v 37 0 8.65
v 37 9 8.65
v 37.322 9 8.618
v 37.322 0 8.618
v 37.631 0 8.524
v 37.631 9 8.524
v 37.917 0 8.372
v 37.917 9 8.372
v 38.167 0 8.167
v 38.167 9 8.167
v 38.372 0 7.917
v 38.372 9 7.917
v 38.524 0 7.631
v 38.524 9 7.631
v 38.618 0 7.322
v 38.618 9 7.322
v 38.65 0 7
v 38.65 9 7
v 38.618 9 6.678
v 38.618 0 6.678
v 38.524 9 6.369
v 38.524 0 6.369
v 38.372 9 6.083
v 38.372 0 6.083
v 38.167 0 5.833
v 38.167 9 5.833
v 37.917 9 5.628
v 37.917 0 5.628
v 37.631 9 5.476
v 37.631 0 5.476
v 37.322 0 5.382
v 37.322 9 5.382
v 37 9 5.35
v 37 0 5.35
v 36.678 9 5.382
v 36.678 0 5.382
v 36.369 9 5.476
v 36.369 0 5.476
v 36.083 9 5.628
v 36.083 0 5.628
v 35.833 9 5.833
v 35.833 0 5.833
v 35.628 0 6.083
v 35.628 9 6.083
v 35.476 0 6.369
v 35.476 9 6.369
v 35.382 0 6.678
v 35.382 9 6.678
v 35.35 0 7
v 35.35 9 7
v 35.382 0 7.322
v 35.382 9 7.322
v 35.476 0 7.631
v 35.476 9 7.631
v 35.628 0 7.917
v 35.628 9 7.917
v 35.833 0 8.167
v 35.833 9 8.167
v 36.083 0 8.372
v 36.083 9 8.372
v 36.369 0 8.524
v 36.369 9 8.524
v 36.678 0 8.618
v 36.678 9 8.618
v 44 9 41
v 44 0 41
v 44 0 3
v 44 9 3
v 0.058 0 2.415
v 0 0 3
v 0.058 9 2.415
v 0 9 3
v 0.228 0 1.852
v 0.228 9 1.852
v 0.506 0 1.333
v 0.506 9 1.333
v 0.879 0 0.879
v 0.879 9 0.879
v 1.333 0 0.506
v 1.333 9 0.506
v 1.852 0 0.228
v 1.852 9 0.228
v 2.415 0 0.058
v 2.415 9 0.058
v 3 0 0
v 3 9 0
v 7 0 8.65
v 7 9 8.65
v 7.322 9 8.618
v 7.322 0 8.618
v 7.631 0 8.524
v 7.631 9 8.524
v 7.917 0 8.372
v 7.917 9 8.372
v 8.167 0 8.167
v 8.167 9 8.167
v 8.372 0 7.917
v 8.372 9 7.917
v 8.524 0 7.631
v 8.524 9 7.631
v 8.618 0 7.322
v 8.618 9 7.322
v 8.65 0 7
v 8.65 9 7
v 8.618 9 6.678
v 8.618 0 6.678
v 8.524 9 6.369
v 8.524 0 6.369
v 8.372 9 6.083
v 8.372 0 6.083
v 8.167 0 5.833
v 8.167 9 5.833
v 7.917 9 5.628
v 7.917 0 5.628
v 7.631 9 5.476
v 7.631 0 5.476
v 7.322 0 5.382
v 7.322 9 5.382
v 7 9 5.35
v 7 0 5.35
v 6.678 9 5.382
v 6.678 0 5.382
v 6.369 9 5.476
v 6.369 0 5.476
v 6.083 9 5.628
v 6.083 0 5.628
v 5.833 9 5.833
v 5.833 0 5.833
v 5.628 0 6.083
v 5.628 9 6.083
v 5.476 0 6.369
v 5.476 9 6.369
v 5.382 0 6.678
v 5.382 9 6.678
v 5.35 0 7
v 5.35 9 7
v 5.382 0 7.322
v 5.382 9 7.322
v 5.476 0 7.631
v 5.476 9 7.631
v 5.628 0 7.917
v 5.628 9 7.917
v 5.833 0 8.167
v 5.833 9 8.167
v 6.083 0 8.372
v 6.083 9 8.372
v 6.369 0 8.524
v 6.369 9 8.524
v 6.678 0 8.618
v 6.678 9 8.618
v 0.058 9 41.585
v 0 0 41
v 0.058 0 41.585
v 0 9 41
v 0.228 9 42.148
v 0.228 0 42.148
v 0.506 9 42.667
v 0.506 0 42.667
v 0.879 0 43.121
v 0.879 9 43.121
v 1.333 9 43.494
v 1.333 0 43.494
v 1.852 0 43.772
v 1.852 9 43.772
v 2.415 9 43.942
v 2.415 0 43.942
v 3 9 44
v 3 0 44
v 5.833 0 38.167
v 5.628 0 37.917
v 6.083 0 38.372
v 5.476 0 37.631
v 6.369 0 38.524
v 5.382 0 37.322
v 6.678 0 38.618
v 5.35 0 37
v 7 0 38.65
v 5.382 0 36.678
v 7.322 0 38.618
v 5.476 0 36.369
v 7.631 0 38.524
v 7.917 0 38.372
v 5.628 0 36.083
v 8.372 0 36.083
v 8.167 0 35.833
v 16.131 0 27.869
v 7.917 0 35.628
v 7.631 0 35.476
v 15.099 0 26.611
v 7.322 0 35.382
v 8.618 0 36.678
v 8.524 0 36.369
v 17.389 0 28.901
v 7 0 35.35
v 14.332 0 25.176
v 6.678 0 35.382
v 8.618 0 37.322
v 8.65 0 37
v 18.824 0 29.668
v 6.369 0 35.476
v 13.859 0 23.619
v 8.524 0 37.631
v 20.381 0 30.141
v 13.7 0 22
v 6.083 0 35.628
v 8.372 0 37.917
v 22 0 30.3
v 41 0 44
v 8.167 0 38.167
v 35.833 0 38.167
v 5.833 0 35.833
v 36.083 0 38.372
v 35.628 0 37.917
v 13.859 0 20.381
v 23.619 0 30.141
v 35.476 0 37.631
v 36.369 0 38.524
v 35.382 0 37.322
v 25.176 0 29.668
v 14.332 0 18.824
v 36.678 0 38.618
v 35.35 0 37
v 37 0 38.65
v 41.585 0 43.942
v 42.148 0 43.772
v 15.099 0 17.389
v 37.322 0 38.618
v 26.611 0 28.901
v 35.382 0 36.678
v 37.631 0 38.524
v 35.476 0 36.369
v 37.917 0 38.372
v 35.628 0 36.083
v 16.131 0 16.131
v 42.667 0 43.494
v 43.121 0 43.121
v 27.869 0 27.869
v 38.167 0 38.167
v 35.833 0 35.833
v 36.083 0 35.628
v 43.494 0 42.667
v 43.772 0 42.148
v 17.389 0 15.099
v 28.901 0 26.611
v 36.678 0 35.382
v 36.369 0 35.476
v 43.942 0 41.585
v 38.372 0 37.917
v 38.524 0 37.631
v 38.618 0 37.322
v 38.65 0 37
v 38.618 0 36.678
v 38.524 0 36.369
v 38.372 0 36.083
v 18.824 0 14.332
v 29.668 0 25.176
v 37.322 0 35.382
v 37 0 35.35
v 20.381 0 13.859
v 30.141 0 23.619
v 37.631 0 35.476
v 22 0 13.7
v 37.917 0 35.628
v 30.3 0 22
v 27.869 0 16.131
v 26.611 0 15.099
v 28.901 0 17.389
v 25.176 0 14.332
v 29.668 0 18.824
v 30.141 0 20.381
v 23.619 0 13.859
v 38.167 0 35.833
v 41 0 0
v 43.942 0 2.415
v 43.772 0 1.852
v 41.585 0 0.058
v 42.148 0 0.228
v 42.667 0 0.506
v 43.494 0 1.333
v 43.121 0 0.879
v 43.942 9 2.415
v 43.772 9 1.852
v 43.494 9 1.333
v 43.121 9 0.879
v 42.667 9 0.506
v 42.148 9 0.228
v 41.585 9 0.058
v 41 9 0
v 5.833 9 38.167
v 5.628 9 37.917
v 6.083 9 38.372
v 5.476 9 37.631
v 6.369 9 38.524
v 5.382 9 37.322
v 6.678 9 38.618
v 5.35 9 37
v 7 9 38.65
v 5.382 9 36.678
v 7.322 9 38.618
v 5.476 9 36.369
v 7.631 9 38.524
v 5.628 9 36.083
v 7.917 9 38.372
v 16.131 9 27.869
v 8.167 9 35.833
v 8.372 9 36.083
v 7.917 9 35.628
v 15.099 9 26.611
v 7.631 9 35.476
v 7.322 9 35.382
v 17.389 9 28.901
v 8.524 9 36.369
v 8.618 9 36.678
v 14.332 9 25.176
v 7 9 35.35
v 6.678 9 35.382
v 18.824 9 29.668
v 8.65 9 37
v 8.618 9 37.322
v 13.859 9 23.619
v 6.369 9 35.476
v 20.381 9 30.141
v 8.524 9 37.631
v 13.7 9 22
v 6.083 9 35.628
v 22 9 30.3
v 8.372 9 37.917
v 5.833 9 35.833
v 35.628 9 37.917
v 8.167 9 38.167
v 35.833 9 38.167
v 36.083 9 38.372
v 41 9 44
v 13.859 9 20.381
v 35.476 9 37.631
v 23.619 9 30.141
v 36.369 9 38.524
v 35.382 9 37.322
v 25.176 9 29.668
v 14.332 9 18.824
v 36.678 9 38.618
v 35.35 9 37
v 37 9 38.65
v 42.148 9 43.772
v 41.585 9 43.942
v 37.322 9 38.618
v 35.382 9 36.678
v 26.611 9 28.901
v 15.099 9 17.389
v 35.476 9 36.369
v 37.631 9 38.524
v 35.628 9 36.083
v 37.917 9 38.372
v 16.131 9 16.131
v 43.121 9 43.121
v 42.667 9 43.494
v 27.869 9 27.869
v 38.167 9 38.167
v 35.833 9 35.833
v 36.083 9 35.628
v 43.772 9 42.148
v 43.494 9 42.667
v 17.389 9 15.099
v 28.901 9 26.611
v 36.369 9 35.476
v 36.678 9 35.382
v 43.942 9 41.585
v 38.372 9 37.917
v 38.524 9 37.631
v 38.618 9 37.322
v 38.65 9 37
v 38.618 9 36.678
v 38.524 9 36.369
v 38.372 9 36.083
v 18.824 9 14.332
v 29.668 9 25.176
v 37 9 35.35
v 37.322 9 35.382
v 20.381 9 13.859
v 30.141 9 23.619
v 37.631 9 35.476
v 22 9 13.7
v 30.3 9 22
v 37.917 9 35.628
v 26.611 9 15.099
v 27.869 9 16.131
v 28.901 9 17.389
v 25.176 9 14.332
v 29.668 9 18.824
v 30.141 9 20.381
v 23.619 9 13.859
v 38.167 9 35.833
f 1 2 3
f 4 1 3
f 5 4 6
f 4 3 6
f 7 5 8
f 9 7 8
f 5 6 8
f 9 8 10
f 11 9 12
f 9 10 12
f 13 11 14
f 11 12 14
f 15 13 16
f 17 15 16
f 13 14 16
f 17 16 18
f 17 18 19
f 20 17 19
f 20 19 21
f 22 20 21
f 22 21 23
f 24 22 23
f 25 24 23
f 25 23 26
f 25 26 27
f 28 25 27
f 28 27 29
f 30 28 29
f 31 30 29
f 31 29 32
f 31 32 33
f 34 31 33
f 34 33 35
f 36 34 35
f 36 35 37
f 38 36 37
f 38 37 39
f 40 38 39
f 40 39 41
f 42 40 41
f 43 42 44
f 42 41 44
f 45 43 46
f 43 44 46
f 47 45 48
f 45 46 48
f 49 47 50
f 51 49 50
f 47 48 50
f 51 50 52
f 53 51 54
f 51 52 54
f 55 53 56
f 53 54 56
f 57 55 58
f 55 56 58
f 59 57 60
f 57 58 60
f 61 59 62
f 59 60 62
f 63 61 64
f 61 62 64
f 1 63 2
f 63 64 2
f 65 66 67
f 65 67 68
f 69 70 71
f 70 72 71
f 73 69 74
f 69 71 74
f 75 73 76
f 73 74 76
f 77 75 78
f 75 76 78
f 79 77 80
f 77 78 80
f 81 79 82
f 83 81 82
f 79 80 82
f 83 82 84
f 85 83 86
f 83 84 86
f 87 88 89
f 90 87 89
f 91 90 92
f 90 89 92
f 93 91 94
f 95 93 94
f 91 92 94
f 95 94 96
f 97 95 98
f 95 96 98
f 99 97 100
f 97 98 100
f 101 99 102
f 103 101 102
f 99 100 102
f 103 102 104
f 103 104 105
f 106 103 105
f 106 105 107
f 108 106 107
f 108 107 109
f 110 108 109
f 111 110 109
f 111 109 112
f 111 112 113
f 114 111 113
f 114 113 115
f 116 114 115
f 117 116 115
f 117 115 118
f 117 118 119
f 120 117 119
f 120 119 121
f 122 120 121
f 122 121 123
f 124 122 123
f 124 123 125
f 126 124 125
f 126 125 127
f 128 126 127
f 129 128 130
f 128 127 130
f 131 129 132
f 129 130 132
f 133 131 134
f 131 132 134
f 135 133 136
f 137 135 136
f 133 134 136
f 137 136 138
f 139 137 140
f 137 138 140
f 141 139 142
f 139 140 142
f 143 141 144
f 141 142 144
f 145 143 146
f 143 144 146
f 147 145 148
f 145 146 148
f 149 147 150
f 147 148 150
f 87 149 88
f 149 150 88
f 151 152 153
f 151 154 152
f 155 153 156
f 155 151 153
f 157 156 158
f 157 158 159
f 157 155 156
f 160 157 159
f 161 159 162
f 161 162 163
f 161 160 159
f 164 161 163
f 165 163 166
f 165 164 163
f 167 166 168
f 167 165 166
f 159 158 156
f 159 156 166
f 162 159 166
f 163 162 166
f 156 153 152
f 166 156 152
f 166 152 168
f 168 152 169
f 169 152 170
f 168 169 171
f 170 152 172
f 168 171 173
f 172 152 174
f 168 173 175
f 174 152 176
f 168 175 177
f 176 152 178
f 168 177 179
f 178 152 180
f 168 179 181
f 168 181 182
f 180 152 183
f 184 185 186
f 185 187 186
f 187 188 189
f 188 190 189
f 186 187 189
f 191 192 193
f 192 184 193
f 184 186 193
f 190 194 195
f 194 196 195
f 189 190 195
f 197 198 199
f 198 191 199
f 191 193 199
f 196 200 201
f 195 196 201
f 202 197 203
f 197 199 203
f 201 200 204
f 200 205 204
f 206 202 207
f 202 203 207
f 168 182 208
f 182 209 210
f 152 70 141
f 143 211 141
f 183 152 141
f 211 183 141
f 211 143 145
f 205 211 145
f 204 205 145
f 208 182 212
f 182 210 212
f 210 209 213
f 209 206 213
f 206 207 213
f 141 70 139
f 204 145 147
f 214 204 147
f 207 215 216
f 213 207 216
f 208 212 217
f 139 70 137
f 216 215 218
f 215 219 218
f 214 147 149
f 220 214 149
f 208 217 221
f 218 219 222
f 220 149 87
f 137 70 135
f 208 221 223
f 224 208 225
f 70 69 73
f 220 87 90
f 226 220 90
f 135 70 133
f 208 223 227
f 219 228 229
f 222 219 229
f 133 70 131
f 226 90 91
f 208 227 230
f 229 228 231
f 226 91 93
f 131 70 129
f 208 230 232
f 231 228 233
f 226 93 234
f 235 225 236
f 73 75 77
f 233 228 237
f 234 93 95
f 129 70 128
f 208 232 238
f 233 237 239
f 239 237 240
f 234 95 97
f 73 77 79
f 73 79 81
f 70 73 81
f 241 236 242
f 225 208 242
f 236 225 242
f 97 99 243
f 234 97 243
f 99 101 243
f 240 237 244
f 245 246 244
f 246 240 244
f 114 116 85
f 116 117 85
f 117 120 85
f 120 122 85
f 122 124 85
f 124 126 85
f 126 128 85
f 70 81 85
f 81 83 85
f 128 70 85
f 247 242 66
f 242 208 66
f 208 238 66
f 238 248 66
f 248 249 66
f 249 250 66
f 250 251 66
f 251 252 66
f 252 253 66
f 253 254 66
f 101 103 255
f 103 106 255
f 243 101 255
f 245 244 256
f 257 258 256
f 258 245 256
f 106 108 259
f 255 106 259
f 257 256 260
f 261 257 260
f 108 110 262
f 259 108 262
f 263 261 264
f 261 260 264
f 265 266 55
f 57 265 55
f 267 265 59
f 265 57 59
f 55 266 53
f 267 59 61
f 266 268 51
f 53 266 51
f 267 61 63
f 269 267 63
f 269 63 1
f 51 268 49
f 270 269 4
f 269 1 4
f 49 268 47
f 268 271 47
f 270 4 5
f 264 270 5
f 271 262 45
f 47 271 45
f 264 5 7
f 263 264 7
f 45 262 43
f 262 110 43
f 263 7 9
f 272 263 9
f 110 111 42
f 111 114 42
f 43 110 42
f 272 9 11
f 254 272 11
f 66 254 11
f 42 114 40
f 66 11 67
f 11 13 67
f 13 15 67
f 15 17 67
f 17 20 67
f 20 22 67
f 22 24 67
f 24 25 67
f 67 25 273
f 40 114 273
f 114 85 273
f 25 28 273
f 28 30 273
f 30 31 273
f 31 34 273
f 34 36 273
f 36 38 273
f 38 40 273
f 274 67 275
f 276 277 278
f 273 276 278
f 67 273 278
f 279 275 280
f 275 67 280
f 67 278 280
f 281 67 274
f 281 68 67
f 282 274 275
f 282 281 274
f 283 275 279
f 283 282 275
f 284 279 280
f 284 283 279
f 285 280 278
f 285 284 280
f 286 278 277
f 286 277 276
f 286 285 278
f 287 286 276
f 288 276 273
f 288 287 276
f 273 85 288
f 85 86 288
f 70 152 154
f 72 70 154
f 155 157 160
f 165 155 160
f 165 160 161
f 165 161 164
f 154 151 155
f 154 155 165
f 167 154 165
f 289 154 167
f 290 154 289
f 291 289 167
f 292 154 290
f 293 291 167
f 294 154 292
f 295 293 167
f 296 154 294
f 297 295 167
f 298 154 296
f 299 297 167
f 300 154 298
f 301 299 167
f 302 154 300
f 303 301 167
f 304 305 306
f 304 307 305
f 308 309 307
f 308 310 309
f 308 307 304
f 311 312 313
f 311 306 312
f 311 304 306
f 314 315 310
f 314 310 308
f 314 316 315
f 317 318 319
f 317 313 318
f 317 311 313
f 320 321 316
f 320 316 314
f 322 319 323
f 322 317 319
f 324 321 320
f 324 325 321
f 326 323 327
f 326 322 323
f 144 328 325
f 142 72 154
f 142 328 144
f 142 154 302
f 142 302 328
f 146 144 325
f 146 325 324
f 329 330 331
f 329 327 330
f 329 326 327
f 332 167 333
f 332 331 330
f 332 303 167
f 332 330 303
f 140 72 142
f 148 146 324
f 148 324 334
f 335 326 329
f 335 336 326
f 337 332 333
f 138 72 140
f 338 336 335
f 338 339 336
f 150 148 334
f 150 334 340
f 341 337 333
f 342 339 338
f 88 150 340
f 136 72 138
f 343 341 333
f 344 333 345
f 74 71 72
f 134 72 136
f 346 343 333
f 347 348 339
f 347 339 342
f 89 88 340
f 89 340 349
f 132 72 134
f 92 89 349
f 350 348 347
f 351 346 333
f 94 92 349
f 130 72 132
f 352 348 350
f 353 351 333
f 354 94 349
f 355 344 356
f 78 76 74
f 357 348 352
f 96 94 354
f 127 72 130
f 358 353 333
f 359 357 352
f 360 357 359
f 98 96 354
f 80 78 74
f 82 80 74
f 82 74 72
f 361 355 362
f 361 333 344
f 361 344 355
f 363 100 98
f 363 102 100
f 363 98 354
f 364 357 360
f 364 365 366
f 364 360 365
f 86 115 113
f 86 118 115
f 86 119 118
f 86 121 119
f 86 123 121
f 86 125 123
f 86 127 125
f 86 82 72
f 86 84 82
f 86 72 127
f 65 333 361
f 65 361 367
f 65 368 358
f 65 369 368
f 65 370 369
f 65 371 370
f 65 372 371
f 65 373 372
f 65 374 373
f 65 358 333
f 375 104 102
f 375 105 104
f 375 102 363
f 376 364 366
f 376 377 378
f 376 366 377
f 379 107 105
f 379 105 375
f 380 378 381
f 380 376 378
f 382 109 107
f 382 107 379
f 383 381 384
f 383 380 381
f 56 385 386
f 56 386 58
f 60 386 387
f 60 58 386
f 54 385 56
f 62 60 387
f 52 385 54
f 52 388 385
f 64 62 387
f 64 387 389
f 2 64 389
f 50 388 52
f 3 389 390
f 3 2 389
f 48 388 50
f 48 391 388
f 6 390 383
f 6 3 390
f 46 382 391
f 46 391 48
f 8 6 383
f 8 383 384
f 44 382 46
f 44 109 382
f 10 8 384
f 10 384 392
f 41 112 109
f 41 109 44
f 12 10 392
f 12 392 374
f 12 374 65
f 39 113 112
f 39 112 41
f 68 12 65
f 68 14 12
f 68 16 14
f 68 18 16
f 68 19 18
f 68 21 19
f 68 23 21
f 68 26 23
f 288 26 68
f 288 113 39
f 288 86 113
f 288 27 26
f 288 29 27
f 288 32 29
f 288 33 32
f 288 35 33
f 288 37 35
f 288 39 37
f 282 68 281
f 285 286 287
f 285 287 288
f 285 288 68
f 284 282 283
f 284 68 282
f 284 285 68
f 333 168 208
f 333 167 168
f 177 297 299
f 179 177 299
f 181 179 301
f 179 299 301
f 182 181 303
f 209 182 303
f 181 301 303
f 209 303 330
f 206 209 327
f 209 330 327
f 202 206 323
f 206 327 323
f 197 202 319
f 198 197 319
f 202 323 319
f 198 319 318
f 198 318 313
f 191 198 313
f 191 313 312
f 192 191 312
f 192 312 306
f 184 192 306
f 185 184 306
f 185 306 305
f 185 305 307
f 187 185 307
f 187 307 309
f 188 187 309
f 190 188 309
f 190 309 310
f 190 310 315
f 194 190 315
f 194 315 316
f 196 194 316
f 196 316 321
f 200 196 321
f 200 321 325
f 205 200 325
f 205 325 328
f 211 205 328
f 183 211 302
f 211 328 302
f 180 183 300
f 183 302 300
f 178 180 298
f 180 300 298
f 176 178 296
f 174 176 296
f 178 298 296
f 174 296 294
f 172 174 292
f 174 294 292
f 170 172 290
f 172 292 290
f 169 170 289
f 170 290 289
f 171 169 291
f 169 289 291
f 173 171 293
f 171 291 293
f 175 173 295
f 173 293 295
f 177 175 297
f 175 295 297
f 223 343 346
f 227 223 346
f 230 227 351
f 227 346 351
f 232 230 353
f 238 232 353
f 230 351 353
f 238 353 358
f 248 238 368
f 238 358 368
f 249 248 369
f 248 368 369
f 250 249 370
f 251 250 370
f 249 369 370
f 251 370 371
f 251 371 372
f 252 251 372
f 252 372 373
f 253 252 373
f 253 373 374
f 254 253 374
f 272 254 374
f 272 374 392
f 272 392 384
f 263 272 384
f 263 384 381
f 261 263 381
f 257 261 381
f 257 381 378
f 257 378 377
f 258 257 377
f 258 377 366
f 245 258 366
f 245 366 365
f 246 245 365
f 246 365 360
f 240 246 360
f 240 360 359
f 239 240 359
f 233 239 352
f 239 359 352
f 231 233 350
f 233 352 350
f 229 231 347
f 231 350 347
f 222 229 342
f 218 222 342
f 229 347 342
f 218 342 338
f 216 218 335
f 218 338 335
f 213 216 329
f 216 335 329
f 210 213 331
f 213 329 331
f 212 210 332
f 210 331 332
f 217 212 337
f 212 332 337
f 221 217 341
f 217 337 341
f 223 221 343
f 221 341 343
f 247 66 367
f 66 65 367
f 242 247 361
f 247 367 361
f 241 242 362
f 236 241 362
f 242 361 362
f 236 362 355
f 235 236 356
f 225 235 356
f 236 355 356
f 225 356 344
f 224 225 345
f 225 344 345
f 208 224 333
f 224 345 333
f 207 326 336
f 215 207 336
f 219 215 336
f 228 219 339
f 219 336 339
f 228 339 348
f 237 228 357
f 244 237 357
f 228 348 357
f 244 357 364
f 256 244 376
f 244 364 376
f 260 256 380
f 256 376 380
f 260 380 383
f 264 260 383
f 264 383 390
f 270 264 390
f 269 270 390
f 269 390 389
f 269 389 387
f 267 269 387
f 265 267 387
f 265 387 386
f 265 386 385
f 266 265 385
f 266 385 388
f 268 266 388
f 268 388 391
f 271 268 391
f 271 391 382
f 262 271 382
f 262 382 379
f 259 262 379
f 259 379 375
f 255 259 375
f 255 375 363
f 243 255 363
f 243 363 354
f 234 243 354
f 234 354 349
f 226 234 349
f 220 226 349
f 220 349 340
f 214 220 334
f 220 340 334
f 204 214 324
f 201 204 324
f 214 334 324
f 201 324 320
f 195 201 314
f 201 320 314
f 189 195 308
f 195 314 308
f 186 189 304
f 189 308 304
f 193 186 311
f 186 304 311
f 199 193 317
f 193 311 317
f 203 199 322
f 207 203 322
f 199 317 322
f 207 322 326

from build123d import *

# Parameters (mm, degrees)
SKETCH_1_W          = 44
SKETCH_1_H          = 9
RAISED_FLANGE_DEPTH = 44
FILLET_2_R          = 3
SKETCH_2_R          = 8.3
FLANGE_HOLE_DEPTH   = 63.872887638
SKETCH_3_R          = 1.65
CUT_EXTRUDE_2_DEPTH = 63.872887638
SKETCH_4_R          = 1.65
CUT_EXTRUDE_3_DEPTH = 63.872887638
SKETCH_5_R          = 1.65
CUT_EXTRUDE_4_DEPTH = 63.872887638
SKETCH_6_R          = 1.65
CUT_EXTRUDE_5_DEPTH = 63.872887638


with BuildPart() as part:
    # 草图1 → Raised_flange (new body)
    with BuildSketch(Plane.XY):
        with Locations((22, 4.5)):
            Rectangle(SKETCH_1_W, SKETCH_1_H)
    extrude(amount=RAISED_FLANGE_DEPTH)

    # Fillet 2
    fillet_2_edges = [part.edges().sort_by_distance(p)[0] for p in [
        (44, 4.5, 44),
        (0, 4.5, 44),
        (44, 4.5, 0),
        (0, 4.5, 0),
    ]]
    fillet(fillet_2_edges, radius=FILLET_2_R)

    # 草图2 → Flange_hole (cut, through all)
    with BuildSketch(Plane(origin=(0, 9, 0), x_dir=(1, 0, 0), z_dir=(0, 1, 0))):
        with Locations(Location((22, -22, 0), (0, 0, 270))):
            Circle(SKETCH_2_R)
    extrude(amount=-FLANGE_HOLE_DEPTH, mode=Mode.SUBTRACT)

    # 草图3 → 切除-拉伸2 (cut, through all)
    with BuildSketch(Plane(origin=(0, 9, 0), x_dir=(1, 0, 0), z_dir=(0, 1, 0))):
        with Locations(Location((7, -7, 0), (0, 0, 270))):
            Circle(SKETCH_3_R)
    extrude(amount=-CUT_EXTRUDE_2_DEPTH, mode=Mode.SUBTRACT)

    # 草图4 → 切除-拉伸3 (cut, through all)
    with BuildSketch(Plane(origin=(0, 9, 0), x_dir=(1, 0, 0), z_dir=(0, 1, 0))):
        with Locations(Location((7, -37, 0), (0, 0, 270))):
            Circle(SKETCH_4_R)
    extrude(amount=-CUT_EXTRUDE_3_DEPTH, mode=Mode.SUBTRACT)

    # 草图5 → 切除-拉伸4 (cut, through all)
    with BuildSketch(Plane(origin=(0, 9, 0), x_dir=(1, 0, 0), z_dir=(0, 1, 0))):
        with Locations(Location((37, -7, 0), (0, 0, 270))):
            Circle(SKETCH_5_R)
    extrude(amount=-CUT_EXTRUDE_4_DEPTH, mode=Mode.SUBTRACT)

    # 草图6 → 切除-拉伸5 (cut, through all)
    with BuildSketch(Plane(origin=(0, 9, 0), x_dir=(1, 0, 0), z_dir=(0, 1, 0))):
        with Locations(Location((37, -37, 0), (0, 0, 270))):
            Circle(SKETCH_6_R)
    extrude(amount=-CUT_EXTRUDE_5_DEPTH, mode=Mode.SUBTRACT)


solid = part.part
